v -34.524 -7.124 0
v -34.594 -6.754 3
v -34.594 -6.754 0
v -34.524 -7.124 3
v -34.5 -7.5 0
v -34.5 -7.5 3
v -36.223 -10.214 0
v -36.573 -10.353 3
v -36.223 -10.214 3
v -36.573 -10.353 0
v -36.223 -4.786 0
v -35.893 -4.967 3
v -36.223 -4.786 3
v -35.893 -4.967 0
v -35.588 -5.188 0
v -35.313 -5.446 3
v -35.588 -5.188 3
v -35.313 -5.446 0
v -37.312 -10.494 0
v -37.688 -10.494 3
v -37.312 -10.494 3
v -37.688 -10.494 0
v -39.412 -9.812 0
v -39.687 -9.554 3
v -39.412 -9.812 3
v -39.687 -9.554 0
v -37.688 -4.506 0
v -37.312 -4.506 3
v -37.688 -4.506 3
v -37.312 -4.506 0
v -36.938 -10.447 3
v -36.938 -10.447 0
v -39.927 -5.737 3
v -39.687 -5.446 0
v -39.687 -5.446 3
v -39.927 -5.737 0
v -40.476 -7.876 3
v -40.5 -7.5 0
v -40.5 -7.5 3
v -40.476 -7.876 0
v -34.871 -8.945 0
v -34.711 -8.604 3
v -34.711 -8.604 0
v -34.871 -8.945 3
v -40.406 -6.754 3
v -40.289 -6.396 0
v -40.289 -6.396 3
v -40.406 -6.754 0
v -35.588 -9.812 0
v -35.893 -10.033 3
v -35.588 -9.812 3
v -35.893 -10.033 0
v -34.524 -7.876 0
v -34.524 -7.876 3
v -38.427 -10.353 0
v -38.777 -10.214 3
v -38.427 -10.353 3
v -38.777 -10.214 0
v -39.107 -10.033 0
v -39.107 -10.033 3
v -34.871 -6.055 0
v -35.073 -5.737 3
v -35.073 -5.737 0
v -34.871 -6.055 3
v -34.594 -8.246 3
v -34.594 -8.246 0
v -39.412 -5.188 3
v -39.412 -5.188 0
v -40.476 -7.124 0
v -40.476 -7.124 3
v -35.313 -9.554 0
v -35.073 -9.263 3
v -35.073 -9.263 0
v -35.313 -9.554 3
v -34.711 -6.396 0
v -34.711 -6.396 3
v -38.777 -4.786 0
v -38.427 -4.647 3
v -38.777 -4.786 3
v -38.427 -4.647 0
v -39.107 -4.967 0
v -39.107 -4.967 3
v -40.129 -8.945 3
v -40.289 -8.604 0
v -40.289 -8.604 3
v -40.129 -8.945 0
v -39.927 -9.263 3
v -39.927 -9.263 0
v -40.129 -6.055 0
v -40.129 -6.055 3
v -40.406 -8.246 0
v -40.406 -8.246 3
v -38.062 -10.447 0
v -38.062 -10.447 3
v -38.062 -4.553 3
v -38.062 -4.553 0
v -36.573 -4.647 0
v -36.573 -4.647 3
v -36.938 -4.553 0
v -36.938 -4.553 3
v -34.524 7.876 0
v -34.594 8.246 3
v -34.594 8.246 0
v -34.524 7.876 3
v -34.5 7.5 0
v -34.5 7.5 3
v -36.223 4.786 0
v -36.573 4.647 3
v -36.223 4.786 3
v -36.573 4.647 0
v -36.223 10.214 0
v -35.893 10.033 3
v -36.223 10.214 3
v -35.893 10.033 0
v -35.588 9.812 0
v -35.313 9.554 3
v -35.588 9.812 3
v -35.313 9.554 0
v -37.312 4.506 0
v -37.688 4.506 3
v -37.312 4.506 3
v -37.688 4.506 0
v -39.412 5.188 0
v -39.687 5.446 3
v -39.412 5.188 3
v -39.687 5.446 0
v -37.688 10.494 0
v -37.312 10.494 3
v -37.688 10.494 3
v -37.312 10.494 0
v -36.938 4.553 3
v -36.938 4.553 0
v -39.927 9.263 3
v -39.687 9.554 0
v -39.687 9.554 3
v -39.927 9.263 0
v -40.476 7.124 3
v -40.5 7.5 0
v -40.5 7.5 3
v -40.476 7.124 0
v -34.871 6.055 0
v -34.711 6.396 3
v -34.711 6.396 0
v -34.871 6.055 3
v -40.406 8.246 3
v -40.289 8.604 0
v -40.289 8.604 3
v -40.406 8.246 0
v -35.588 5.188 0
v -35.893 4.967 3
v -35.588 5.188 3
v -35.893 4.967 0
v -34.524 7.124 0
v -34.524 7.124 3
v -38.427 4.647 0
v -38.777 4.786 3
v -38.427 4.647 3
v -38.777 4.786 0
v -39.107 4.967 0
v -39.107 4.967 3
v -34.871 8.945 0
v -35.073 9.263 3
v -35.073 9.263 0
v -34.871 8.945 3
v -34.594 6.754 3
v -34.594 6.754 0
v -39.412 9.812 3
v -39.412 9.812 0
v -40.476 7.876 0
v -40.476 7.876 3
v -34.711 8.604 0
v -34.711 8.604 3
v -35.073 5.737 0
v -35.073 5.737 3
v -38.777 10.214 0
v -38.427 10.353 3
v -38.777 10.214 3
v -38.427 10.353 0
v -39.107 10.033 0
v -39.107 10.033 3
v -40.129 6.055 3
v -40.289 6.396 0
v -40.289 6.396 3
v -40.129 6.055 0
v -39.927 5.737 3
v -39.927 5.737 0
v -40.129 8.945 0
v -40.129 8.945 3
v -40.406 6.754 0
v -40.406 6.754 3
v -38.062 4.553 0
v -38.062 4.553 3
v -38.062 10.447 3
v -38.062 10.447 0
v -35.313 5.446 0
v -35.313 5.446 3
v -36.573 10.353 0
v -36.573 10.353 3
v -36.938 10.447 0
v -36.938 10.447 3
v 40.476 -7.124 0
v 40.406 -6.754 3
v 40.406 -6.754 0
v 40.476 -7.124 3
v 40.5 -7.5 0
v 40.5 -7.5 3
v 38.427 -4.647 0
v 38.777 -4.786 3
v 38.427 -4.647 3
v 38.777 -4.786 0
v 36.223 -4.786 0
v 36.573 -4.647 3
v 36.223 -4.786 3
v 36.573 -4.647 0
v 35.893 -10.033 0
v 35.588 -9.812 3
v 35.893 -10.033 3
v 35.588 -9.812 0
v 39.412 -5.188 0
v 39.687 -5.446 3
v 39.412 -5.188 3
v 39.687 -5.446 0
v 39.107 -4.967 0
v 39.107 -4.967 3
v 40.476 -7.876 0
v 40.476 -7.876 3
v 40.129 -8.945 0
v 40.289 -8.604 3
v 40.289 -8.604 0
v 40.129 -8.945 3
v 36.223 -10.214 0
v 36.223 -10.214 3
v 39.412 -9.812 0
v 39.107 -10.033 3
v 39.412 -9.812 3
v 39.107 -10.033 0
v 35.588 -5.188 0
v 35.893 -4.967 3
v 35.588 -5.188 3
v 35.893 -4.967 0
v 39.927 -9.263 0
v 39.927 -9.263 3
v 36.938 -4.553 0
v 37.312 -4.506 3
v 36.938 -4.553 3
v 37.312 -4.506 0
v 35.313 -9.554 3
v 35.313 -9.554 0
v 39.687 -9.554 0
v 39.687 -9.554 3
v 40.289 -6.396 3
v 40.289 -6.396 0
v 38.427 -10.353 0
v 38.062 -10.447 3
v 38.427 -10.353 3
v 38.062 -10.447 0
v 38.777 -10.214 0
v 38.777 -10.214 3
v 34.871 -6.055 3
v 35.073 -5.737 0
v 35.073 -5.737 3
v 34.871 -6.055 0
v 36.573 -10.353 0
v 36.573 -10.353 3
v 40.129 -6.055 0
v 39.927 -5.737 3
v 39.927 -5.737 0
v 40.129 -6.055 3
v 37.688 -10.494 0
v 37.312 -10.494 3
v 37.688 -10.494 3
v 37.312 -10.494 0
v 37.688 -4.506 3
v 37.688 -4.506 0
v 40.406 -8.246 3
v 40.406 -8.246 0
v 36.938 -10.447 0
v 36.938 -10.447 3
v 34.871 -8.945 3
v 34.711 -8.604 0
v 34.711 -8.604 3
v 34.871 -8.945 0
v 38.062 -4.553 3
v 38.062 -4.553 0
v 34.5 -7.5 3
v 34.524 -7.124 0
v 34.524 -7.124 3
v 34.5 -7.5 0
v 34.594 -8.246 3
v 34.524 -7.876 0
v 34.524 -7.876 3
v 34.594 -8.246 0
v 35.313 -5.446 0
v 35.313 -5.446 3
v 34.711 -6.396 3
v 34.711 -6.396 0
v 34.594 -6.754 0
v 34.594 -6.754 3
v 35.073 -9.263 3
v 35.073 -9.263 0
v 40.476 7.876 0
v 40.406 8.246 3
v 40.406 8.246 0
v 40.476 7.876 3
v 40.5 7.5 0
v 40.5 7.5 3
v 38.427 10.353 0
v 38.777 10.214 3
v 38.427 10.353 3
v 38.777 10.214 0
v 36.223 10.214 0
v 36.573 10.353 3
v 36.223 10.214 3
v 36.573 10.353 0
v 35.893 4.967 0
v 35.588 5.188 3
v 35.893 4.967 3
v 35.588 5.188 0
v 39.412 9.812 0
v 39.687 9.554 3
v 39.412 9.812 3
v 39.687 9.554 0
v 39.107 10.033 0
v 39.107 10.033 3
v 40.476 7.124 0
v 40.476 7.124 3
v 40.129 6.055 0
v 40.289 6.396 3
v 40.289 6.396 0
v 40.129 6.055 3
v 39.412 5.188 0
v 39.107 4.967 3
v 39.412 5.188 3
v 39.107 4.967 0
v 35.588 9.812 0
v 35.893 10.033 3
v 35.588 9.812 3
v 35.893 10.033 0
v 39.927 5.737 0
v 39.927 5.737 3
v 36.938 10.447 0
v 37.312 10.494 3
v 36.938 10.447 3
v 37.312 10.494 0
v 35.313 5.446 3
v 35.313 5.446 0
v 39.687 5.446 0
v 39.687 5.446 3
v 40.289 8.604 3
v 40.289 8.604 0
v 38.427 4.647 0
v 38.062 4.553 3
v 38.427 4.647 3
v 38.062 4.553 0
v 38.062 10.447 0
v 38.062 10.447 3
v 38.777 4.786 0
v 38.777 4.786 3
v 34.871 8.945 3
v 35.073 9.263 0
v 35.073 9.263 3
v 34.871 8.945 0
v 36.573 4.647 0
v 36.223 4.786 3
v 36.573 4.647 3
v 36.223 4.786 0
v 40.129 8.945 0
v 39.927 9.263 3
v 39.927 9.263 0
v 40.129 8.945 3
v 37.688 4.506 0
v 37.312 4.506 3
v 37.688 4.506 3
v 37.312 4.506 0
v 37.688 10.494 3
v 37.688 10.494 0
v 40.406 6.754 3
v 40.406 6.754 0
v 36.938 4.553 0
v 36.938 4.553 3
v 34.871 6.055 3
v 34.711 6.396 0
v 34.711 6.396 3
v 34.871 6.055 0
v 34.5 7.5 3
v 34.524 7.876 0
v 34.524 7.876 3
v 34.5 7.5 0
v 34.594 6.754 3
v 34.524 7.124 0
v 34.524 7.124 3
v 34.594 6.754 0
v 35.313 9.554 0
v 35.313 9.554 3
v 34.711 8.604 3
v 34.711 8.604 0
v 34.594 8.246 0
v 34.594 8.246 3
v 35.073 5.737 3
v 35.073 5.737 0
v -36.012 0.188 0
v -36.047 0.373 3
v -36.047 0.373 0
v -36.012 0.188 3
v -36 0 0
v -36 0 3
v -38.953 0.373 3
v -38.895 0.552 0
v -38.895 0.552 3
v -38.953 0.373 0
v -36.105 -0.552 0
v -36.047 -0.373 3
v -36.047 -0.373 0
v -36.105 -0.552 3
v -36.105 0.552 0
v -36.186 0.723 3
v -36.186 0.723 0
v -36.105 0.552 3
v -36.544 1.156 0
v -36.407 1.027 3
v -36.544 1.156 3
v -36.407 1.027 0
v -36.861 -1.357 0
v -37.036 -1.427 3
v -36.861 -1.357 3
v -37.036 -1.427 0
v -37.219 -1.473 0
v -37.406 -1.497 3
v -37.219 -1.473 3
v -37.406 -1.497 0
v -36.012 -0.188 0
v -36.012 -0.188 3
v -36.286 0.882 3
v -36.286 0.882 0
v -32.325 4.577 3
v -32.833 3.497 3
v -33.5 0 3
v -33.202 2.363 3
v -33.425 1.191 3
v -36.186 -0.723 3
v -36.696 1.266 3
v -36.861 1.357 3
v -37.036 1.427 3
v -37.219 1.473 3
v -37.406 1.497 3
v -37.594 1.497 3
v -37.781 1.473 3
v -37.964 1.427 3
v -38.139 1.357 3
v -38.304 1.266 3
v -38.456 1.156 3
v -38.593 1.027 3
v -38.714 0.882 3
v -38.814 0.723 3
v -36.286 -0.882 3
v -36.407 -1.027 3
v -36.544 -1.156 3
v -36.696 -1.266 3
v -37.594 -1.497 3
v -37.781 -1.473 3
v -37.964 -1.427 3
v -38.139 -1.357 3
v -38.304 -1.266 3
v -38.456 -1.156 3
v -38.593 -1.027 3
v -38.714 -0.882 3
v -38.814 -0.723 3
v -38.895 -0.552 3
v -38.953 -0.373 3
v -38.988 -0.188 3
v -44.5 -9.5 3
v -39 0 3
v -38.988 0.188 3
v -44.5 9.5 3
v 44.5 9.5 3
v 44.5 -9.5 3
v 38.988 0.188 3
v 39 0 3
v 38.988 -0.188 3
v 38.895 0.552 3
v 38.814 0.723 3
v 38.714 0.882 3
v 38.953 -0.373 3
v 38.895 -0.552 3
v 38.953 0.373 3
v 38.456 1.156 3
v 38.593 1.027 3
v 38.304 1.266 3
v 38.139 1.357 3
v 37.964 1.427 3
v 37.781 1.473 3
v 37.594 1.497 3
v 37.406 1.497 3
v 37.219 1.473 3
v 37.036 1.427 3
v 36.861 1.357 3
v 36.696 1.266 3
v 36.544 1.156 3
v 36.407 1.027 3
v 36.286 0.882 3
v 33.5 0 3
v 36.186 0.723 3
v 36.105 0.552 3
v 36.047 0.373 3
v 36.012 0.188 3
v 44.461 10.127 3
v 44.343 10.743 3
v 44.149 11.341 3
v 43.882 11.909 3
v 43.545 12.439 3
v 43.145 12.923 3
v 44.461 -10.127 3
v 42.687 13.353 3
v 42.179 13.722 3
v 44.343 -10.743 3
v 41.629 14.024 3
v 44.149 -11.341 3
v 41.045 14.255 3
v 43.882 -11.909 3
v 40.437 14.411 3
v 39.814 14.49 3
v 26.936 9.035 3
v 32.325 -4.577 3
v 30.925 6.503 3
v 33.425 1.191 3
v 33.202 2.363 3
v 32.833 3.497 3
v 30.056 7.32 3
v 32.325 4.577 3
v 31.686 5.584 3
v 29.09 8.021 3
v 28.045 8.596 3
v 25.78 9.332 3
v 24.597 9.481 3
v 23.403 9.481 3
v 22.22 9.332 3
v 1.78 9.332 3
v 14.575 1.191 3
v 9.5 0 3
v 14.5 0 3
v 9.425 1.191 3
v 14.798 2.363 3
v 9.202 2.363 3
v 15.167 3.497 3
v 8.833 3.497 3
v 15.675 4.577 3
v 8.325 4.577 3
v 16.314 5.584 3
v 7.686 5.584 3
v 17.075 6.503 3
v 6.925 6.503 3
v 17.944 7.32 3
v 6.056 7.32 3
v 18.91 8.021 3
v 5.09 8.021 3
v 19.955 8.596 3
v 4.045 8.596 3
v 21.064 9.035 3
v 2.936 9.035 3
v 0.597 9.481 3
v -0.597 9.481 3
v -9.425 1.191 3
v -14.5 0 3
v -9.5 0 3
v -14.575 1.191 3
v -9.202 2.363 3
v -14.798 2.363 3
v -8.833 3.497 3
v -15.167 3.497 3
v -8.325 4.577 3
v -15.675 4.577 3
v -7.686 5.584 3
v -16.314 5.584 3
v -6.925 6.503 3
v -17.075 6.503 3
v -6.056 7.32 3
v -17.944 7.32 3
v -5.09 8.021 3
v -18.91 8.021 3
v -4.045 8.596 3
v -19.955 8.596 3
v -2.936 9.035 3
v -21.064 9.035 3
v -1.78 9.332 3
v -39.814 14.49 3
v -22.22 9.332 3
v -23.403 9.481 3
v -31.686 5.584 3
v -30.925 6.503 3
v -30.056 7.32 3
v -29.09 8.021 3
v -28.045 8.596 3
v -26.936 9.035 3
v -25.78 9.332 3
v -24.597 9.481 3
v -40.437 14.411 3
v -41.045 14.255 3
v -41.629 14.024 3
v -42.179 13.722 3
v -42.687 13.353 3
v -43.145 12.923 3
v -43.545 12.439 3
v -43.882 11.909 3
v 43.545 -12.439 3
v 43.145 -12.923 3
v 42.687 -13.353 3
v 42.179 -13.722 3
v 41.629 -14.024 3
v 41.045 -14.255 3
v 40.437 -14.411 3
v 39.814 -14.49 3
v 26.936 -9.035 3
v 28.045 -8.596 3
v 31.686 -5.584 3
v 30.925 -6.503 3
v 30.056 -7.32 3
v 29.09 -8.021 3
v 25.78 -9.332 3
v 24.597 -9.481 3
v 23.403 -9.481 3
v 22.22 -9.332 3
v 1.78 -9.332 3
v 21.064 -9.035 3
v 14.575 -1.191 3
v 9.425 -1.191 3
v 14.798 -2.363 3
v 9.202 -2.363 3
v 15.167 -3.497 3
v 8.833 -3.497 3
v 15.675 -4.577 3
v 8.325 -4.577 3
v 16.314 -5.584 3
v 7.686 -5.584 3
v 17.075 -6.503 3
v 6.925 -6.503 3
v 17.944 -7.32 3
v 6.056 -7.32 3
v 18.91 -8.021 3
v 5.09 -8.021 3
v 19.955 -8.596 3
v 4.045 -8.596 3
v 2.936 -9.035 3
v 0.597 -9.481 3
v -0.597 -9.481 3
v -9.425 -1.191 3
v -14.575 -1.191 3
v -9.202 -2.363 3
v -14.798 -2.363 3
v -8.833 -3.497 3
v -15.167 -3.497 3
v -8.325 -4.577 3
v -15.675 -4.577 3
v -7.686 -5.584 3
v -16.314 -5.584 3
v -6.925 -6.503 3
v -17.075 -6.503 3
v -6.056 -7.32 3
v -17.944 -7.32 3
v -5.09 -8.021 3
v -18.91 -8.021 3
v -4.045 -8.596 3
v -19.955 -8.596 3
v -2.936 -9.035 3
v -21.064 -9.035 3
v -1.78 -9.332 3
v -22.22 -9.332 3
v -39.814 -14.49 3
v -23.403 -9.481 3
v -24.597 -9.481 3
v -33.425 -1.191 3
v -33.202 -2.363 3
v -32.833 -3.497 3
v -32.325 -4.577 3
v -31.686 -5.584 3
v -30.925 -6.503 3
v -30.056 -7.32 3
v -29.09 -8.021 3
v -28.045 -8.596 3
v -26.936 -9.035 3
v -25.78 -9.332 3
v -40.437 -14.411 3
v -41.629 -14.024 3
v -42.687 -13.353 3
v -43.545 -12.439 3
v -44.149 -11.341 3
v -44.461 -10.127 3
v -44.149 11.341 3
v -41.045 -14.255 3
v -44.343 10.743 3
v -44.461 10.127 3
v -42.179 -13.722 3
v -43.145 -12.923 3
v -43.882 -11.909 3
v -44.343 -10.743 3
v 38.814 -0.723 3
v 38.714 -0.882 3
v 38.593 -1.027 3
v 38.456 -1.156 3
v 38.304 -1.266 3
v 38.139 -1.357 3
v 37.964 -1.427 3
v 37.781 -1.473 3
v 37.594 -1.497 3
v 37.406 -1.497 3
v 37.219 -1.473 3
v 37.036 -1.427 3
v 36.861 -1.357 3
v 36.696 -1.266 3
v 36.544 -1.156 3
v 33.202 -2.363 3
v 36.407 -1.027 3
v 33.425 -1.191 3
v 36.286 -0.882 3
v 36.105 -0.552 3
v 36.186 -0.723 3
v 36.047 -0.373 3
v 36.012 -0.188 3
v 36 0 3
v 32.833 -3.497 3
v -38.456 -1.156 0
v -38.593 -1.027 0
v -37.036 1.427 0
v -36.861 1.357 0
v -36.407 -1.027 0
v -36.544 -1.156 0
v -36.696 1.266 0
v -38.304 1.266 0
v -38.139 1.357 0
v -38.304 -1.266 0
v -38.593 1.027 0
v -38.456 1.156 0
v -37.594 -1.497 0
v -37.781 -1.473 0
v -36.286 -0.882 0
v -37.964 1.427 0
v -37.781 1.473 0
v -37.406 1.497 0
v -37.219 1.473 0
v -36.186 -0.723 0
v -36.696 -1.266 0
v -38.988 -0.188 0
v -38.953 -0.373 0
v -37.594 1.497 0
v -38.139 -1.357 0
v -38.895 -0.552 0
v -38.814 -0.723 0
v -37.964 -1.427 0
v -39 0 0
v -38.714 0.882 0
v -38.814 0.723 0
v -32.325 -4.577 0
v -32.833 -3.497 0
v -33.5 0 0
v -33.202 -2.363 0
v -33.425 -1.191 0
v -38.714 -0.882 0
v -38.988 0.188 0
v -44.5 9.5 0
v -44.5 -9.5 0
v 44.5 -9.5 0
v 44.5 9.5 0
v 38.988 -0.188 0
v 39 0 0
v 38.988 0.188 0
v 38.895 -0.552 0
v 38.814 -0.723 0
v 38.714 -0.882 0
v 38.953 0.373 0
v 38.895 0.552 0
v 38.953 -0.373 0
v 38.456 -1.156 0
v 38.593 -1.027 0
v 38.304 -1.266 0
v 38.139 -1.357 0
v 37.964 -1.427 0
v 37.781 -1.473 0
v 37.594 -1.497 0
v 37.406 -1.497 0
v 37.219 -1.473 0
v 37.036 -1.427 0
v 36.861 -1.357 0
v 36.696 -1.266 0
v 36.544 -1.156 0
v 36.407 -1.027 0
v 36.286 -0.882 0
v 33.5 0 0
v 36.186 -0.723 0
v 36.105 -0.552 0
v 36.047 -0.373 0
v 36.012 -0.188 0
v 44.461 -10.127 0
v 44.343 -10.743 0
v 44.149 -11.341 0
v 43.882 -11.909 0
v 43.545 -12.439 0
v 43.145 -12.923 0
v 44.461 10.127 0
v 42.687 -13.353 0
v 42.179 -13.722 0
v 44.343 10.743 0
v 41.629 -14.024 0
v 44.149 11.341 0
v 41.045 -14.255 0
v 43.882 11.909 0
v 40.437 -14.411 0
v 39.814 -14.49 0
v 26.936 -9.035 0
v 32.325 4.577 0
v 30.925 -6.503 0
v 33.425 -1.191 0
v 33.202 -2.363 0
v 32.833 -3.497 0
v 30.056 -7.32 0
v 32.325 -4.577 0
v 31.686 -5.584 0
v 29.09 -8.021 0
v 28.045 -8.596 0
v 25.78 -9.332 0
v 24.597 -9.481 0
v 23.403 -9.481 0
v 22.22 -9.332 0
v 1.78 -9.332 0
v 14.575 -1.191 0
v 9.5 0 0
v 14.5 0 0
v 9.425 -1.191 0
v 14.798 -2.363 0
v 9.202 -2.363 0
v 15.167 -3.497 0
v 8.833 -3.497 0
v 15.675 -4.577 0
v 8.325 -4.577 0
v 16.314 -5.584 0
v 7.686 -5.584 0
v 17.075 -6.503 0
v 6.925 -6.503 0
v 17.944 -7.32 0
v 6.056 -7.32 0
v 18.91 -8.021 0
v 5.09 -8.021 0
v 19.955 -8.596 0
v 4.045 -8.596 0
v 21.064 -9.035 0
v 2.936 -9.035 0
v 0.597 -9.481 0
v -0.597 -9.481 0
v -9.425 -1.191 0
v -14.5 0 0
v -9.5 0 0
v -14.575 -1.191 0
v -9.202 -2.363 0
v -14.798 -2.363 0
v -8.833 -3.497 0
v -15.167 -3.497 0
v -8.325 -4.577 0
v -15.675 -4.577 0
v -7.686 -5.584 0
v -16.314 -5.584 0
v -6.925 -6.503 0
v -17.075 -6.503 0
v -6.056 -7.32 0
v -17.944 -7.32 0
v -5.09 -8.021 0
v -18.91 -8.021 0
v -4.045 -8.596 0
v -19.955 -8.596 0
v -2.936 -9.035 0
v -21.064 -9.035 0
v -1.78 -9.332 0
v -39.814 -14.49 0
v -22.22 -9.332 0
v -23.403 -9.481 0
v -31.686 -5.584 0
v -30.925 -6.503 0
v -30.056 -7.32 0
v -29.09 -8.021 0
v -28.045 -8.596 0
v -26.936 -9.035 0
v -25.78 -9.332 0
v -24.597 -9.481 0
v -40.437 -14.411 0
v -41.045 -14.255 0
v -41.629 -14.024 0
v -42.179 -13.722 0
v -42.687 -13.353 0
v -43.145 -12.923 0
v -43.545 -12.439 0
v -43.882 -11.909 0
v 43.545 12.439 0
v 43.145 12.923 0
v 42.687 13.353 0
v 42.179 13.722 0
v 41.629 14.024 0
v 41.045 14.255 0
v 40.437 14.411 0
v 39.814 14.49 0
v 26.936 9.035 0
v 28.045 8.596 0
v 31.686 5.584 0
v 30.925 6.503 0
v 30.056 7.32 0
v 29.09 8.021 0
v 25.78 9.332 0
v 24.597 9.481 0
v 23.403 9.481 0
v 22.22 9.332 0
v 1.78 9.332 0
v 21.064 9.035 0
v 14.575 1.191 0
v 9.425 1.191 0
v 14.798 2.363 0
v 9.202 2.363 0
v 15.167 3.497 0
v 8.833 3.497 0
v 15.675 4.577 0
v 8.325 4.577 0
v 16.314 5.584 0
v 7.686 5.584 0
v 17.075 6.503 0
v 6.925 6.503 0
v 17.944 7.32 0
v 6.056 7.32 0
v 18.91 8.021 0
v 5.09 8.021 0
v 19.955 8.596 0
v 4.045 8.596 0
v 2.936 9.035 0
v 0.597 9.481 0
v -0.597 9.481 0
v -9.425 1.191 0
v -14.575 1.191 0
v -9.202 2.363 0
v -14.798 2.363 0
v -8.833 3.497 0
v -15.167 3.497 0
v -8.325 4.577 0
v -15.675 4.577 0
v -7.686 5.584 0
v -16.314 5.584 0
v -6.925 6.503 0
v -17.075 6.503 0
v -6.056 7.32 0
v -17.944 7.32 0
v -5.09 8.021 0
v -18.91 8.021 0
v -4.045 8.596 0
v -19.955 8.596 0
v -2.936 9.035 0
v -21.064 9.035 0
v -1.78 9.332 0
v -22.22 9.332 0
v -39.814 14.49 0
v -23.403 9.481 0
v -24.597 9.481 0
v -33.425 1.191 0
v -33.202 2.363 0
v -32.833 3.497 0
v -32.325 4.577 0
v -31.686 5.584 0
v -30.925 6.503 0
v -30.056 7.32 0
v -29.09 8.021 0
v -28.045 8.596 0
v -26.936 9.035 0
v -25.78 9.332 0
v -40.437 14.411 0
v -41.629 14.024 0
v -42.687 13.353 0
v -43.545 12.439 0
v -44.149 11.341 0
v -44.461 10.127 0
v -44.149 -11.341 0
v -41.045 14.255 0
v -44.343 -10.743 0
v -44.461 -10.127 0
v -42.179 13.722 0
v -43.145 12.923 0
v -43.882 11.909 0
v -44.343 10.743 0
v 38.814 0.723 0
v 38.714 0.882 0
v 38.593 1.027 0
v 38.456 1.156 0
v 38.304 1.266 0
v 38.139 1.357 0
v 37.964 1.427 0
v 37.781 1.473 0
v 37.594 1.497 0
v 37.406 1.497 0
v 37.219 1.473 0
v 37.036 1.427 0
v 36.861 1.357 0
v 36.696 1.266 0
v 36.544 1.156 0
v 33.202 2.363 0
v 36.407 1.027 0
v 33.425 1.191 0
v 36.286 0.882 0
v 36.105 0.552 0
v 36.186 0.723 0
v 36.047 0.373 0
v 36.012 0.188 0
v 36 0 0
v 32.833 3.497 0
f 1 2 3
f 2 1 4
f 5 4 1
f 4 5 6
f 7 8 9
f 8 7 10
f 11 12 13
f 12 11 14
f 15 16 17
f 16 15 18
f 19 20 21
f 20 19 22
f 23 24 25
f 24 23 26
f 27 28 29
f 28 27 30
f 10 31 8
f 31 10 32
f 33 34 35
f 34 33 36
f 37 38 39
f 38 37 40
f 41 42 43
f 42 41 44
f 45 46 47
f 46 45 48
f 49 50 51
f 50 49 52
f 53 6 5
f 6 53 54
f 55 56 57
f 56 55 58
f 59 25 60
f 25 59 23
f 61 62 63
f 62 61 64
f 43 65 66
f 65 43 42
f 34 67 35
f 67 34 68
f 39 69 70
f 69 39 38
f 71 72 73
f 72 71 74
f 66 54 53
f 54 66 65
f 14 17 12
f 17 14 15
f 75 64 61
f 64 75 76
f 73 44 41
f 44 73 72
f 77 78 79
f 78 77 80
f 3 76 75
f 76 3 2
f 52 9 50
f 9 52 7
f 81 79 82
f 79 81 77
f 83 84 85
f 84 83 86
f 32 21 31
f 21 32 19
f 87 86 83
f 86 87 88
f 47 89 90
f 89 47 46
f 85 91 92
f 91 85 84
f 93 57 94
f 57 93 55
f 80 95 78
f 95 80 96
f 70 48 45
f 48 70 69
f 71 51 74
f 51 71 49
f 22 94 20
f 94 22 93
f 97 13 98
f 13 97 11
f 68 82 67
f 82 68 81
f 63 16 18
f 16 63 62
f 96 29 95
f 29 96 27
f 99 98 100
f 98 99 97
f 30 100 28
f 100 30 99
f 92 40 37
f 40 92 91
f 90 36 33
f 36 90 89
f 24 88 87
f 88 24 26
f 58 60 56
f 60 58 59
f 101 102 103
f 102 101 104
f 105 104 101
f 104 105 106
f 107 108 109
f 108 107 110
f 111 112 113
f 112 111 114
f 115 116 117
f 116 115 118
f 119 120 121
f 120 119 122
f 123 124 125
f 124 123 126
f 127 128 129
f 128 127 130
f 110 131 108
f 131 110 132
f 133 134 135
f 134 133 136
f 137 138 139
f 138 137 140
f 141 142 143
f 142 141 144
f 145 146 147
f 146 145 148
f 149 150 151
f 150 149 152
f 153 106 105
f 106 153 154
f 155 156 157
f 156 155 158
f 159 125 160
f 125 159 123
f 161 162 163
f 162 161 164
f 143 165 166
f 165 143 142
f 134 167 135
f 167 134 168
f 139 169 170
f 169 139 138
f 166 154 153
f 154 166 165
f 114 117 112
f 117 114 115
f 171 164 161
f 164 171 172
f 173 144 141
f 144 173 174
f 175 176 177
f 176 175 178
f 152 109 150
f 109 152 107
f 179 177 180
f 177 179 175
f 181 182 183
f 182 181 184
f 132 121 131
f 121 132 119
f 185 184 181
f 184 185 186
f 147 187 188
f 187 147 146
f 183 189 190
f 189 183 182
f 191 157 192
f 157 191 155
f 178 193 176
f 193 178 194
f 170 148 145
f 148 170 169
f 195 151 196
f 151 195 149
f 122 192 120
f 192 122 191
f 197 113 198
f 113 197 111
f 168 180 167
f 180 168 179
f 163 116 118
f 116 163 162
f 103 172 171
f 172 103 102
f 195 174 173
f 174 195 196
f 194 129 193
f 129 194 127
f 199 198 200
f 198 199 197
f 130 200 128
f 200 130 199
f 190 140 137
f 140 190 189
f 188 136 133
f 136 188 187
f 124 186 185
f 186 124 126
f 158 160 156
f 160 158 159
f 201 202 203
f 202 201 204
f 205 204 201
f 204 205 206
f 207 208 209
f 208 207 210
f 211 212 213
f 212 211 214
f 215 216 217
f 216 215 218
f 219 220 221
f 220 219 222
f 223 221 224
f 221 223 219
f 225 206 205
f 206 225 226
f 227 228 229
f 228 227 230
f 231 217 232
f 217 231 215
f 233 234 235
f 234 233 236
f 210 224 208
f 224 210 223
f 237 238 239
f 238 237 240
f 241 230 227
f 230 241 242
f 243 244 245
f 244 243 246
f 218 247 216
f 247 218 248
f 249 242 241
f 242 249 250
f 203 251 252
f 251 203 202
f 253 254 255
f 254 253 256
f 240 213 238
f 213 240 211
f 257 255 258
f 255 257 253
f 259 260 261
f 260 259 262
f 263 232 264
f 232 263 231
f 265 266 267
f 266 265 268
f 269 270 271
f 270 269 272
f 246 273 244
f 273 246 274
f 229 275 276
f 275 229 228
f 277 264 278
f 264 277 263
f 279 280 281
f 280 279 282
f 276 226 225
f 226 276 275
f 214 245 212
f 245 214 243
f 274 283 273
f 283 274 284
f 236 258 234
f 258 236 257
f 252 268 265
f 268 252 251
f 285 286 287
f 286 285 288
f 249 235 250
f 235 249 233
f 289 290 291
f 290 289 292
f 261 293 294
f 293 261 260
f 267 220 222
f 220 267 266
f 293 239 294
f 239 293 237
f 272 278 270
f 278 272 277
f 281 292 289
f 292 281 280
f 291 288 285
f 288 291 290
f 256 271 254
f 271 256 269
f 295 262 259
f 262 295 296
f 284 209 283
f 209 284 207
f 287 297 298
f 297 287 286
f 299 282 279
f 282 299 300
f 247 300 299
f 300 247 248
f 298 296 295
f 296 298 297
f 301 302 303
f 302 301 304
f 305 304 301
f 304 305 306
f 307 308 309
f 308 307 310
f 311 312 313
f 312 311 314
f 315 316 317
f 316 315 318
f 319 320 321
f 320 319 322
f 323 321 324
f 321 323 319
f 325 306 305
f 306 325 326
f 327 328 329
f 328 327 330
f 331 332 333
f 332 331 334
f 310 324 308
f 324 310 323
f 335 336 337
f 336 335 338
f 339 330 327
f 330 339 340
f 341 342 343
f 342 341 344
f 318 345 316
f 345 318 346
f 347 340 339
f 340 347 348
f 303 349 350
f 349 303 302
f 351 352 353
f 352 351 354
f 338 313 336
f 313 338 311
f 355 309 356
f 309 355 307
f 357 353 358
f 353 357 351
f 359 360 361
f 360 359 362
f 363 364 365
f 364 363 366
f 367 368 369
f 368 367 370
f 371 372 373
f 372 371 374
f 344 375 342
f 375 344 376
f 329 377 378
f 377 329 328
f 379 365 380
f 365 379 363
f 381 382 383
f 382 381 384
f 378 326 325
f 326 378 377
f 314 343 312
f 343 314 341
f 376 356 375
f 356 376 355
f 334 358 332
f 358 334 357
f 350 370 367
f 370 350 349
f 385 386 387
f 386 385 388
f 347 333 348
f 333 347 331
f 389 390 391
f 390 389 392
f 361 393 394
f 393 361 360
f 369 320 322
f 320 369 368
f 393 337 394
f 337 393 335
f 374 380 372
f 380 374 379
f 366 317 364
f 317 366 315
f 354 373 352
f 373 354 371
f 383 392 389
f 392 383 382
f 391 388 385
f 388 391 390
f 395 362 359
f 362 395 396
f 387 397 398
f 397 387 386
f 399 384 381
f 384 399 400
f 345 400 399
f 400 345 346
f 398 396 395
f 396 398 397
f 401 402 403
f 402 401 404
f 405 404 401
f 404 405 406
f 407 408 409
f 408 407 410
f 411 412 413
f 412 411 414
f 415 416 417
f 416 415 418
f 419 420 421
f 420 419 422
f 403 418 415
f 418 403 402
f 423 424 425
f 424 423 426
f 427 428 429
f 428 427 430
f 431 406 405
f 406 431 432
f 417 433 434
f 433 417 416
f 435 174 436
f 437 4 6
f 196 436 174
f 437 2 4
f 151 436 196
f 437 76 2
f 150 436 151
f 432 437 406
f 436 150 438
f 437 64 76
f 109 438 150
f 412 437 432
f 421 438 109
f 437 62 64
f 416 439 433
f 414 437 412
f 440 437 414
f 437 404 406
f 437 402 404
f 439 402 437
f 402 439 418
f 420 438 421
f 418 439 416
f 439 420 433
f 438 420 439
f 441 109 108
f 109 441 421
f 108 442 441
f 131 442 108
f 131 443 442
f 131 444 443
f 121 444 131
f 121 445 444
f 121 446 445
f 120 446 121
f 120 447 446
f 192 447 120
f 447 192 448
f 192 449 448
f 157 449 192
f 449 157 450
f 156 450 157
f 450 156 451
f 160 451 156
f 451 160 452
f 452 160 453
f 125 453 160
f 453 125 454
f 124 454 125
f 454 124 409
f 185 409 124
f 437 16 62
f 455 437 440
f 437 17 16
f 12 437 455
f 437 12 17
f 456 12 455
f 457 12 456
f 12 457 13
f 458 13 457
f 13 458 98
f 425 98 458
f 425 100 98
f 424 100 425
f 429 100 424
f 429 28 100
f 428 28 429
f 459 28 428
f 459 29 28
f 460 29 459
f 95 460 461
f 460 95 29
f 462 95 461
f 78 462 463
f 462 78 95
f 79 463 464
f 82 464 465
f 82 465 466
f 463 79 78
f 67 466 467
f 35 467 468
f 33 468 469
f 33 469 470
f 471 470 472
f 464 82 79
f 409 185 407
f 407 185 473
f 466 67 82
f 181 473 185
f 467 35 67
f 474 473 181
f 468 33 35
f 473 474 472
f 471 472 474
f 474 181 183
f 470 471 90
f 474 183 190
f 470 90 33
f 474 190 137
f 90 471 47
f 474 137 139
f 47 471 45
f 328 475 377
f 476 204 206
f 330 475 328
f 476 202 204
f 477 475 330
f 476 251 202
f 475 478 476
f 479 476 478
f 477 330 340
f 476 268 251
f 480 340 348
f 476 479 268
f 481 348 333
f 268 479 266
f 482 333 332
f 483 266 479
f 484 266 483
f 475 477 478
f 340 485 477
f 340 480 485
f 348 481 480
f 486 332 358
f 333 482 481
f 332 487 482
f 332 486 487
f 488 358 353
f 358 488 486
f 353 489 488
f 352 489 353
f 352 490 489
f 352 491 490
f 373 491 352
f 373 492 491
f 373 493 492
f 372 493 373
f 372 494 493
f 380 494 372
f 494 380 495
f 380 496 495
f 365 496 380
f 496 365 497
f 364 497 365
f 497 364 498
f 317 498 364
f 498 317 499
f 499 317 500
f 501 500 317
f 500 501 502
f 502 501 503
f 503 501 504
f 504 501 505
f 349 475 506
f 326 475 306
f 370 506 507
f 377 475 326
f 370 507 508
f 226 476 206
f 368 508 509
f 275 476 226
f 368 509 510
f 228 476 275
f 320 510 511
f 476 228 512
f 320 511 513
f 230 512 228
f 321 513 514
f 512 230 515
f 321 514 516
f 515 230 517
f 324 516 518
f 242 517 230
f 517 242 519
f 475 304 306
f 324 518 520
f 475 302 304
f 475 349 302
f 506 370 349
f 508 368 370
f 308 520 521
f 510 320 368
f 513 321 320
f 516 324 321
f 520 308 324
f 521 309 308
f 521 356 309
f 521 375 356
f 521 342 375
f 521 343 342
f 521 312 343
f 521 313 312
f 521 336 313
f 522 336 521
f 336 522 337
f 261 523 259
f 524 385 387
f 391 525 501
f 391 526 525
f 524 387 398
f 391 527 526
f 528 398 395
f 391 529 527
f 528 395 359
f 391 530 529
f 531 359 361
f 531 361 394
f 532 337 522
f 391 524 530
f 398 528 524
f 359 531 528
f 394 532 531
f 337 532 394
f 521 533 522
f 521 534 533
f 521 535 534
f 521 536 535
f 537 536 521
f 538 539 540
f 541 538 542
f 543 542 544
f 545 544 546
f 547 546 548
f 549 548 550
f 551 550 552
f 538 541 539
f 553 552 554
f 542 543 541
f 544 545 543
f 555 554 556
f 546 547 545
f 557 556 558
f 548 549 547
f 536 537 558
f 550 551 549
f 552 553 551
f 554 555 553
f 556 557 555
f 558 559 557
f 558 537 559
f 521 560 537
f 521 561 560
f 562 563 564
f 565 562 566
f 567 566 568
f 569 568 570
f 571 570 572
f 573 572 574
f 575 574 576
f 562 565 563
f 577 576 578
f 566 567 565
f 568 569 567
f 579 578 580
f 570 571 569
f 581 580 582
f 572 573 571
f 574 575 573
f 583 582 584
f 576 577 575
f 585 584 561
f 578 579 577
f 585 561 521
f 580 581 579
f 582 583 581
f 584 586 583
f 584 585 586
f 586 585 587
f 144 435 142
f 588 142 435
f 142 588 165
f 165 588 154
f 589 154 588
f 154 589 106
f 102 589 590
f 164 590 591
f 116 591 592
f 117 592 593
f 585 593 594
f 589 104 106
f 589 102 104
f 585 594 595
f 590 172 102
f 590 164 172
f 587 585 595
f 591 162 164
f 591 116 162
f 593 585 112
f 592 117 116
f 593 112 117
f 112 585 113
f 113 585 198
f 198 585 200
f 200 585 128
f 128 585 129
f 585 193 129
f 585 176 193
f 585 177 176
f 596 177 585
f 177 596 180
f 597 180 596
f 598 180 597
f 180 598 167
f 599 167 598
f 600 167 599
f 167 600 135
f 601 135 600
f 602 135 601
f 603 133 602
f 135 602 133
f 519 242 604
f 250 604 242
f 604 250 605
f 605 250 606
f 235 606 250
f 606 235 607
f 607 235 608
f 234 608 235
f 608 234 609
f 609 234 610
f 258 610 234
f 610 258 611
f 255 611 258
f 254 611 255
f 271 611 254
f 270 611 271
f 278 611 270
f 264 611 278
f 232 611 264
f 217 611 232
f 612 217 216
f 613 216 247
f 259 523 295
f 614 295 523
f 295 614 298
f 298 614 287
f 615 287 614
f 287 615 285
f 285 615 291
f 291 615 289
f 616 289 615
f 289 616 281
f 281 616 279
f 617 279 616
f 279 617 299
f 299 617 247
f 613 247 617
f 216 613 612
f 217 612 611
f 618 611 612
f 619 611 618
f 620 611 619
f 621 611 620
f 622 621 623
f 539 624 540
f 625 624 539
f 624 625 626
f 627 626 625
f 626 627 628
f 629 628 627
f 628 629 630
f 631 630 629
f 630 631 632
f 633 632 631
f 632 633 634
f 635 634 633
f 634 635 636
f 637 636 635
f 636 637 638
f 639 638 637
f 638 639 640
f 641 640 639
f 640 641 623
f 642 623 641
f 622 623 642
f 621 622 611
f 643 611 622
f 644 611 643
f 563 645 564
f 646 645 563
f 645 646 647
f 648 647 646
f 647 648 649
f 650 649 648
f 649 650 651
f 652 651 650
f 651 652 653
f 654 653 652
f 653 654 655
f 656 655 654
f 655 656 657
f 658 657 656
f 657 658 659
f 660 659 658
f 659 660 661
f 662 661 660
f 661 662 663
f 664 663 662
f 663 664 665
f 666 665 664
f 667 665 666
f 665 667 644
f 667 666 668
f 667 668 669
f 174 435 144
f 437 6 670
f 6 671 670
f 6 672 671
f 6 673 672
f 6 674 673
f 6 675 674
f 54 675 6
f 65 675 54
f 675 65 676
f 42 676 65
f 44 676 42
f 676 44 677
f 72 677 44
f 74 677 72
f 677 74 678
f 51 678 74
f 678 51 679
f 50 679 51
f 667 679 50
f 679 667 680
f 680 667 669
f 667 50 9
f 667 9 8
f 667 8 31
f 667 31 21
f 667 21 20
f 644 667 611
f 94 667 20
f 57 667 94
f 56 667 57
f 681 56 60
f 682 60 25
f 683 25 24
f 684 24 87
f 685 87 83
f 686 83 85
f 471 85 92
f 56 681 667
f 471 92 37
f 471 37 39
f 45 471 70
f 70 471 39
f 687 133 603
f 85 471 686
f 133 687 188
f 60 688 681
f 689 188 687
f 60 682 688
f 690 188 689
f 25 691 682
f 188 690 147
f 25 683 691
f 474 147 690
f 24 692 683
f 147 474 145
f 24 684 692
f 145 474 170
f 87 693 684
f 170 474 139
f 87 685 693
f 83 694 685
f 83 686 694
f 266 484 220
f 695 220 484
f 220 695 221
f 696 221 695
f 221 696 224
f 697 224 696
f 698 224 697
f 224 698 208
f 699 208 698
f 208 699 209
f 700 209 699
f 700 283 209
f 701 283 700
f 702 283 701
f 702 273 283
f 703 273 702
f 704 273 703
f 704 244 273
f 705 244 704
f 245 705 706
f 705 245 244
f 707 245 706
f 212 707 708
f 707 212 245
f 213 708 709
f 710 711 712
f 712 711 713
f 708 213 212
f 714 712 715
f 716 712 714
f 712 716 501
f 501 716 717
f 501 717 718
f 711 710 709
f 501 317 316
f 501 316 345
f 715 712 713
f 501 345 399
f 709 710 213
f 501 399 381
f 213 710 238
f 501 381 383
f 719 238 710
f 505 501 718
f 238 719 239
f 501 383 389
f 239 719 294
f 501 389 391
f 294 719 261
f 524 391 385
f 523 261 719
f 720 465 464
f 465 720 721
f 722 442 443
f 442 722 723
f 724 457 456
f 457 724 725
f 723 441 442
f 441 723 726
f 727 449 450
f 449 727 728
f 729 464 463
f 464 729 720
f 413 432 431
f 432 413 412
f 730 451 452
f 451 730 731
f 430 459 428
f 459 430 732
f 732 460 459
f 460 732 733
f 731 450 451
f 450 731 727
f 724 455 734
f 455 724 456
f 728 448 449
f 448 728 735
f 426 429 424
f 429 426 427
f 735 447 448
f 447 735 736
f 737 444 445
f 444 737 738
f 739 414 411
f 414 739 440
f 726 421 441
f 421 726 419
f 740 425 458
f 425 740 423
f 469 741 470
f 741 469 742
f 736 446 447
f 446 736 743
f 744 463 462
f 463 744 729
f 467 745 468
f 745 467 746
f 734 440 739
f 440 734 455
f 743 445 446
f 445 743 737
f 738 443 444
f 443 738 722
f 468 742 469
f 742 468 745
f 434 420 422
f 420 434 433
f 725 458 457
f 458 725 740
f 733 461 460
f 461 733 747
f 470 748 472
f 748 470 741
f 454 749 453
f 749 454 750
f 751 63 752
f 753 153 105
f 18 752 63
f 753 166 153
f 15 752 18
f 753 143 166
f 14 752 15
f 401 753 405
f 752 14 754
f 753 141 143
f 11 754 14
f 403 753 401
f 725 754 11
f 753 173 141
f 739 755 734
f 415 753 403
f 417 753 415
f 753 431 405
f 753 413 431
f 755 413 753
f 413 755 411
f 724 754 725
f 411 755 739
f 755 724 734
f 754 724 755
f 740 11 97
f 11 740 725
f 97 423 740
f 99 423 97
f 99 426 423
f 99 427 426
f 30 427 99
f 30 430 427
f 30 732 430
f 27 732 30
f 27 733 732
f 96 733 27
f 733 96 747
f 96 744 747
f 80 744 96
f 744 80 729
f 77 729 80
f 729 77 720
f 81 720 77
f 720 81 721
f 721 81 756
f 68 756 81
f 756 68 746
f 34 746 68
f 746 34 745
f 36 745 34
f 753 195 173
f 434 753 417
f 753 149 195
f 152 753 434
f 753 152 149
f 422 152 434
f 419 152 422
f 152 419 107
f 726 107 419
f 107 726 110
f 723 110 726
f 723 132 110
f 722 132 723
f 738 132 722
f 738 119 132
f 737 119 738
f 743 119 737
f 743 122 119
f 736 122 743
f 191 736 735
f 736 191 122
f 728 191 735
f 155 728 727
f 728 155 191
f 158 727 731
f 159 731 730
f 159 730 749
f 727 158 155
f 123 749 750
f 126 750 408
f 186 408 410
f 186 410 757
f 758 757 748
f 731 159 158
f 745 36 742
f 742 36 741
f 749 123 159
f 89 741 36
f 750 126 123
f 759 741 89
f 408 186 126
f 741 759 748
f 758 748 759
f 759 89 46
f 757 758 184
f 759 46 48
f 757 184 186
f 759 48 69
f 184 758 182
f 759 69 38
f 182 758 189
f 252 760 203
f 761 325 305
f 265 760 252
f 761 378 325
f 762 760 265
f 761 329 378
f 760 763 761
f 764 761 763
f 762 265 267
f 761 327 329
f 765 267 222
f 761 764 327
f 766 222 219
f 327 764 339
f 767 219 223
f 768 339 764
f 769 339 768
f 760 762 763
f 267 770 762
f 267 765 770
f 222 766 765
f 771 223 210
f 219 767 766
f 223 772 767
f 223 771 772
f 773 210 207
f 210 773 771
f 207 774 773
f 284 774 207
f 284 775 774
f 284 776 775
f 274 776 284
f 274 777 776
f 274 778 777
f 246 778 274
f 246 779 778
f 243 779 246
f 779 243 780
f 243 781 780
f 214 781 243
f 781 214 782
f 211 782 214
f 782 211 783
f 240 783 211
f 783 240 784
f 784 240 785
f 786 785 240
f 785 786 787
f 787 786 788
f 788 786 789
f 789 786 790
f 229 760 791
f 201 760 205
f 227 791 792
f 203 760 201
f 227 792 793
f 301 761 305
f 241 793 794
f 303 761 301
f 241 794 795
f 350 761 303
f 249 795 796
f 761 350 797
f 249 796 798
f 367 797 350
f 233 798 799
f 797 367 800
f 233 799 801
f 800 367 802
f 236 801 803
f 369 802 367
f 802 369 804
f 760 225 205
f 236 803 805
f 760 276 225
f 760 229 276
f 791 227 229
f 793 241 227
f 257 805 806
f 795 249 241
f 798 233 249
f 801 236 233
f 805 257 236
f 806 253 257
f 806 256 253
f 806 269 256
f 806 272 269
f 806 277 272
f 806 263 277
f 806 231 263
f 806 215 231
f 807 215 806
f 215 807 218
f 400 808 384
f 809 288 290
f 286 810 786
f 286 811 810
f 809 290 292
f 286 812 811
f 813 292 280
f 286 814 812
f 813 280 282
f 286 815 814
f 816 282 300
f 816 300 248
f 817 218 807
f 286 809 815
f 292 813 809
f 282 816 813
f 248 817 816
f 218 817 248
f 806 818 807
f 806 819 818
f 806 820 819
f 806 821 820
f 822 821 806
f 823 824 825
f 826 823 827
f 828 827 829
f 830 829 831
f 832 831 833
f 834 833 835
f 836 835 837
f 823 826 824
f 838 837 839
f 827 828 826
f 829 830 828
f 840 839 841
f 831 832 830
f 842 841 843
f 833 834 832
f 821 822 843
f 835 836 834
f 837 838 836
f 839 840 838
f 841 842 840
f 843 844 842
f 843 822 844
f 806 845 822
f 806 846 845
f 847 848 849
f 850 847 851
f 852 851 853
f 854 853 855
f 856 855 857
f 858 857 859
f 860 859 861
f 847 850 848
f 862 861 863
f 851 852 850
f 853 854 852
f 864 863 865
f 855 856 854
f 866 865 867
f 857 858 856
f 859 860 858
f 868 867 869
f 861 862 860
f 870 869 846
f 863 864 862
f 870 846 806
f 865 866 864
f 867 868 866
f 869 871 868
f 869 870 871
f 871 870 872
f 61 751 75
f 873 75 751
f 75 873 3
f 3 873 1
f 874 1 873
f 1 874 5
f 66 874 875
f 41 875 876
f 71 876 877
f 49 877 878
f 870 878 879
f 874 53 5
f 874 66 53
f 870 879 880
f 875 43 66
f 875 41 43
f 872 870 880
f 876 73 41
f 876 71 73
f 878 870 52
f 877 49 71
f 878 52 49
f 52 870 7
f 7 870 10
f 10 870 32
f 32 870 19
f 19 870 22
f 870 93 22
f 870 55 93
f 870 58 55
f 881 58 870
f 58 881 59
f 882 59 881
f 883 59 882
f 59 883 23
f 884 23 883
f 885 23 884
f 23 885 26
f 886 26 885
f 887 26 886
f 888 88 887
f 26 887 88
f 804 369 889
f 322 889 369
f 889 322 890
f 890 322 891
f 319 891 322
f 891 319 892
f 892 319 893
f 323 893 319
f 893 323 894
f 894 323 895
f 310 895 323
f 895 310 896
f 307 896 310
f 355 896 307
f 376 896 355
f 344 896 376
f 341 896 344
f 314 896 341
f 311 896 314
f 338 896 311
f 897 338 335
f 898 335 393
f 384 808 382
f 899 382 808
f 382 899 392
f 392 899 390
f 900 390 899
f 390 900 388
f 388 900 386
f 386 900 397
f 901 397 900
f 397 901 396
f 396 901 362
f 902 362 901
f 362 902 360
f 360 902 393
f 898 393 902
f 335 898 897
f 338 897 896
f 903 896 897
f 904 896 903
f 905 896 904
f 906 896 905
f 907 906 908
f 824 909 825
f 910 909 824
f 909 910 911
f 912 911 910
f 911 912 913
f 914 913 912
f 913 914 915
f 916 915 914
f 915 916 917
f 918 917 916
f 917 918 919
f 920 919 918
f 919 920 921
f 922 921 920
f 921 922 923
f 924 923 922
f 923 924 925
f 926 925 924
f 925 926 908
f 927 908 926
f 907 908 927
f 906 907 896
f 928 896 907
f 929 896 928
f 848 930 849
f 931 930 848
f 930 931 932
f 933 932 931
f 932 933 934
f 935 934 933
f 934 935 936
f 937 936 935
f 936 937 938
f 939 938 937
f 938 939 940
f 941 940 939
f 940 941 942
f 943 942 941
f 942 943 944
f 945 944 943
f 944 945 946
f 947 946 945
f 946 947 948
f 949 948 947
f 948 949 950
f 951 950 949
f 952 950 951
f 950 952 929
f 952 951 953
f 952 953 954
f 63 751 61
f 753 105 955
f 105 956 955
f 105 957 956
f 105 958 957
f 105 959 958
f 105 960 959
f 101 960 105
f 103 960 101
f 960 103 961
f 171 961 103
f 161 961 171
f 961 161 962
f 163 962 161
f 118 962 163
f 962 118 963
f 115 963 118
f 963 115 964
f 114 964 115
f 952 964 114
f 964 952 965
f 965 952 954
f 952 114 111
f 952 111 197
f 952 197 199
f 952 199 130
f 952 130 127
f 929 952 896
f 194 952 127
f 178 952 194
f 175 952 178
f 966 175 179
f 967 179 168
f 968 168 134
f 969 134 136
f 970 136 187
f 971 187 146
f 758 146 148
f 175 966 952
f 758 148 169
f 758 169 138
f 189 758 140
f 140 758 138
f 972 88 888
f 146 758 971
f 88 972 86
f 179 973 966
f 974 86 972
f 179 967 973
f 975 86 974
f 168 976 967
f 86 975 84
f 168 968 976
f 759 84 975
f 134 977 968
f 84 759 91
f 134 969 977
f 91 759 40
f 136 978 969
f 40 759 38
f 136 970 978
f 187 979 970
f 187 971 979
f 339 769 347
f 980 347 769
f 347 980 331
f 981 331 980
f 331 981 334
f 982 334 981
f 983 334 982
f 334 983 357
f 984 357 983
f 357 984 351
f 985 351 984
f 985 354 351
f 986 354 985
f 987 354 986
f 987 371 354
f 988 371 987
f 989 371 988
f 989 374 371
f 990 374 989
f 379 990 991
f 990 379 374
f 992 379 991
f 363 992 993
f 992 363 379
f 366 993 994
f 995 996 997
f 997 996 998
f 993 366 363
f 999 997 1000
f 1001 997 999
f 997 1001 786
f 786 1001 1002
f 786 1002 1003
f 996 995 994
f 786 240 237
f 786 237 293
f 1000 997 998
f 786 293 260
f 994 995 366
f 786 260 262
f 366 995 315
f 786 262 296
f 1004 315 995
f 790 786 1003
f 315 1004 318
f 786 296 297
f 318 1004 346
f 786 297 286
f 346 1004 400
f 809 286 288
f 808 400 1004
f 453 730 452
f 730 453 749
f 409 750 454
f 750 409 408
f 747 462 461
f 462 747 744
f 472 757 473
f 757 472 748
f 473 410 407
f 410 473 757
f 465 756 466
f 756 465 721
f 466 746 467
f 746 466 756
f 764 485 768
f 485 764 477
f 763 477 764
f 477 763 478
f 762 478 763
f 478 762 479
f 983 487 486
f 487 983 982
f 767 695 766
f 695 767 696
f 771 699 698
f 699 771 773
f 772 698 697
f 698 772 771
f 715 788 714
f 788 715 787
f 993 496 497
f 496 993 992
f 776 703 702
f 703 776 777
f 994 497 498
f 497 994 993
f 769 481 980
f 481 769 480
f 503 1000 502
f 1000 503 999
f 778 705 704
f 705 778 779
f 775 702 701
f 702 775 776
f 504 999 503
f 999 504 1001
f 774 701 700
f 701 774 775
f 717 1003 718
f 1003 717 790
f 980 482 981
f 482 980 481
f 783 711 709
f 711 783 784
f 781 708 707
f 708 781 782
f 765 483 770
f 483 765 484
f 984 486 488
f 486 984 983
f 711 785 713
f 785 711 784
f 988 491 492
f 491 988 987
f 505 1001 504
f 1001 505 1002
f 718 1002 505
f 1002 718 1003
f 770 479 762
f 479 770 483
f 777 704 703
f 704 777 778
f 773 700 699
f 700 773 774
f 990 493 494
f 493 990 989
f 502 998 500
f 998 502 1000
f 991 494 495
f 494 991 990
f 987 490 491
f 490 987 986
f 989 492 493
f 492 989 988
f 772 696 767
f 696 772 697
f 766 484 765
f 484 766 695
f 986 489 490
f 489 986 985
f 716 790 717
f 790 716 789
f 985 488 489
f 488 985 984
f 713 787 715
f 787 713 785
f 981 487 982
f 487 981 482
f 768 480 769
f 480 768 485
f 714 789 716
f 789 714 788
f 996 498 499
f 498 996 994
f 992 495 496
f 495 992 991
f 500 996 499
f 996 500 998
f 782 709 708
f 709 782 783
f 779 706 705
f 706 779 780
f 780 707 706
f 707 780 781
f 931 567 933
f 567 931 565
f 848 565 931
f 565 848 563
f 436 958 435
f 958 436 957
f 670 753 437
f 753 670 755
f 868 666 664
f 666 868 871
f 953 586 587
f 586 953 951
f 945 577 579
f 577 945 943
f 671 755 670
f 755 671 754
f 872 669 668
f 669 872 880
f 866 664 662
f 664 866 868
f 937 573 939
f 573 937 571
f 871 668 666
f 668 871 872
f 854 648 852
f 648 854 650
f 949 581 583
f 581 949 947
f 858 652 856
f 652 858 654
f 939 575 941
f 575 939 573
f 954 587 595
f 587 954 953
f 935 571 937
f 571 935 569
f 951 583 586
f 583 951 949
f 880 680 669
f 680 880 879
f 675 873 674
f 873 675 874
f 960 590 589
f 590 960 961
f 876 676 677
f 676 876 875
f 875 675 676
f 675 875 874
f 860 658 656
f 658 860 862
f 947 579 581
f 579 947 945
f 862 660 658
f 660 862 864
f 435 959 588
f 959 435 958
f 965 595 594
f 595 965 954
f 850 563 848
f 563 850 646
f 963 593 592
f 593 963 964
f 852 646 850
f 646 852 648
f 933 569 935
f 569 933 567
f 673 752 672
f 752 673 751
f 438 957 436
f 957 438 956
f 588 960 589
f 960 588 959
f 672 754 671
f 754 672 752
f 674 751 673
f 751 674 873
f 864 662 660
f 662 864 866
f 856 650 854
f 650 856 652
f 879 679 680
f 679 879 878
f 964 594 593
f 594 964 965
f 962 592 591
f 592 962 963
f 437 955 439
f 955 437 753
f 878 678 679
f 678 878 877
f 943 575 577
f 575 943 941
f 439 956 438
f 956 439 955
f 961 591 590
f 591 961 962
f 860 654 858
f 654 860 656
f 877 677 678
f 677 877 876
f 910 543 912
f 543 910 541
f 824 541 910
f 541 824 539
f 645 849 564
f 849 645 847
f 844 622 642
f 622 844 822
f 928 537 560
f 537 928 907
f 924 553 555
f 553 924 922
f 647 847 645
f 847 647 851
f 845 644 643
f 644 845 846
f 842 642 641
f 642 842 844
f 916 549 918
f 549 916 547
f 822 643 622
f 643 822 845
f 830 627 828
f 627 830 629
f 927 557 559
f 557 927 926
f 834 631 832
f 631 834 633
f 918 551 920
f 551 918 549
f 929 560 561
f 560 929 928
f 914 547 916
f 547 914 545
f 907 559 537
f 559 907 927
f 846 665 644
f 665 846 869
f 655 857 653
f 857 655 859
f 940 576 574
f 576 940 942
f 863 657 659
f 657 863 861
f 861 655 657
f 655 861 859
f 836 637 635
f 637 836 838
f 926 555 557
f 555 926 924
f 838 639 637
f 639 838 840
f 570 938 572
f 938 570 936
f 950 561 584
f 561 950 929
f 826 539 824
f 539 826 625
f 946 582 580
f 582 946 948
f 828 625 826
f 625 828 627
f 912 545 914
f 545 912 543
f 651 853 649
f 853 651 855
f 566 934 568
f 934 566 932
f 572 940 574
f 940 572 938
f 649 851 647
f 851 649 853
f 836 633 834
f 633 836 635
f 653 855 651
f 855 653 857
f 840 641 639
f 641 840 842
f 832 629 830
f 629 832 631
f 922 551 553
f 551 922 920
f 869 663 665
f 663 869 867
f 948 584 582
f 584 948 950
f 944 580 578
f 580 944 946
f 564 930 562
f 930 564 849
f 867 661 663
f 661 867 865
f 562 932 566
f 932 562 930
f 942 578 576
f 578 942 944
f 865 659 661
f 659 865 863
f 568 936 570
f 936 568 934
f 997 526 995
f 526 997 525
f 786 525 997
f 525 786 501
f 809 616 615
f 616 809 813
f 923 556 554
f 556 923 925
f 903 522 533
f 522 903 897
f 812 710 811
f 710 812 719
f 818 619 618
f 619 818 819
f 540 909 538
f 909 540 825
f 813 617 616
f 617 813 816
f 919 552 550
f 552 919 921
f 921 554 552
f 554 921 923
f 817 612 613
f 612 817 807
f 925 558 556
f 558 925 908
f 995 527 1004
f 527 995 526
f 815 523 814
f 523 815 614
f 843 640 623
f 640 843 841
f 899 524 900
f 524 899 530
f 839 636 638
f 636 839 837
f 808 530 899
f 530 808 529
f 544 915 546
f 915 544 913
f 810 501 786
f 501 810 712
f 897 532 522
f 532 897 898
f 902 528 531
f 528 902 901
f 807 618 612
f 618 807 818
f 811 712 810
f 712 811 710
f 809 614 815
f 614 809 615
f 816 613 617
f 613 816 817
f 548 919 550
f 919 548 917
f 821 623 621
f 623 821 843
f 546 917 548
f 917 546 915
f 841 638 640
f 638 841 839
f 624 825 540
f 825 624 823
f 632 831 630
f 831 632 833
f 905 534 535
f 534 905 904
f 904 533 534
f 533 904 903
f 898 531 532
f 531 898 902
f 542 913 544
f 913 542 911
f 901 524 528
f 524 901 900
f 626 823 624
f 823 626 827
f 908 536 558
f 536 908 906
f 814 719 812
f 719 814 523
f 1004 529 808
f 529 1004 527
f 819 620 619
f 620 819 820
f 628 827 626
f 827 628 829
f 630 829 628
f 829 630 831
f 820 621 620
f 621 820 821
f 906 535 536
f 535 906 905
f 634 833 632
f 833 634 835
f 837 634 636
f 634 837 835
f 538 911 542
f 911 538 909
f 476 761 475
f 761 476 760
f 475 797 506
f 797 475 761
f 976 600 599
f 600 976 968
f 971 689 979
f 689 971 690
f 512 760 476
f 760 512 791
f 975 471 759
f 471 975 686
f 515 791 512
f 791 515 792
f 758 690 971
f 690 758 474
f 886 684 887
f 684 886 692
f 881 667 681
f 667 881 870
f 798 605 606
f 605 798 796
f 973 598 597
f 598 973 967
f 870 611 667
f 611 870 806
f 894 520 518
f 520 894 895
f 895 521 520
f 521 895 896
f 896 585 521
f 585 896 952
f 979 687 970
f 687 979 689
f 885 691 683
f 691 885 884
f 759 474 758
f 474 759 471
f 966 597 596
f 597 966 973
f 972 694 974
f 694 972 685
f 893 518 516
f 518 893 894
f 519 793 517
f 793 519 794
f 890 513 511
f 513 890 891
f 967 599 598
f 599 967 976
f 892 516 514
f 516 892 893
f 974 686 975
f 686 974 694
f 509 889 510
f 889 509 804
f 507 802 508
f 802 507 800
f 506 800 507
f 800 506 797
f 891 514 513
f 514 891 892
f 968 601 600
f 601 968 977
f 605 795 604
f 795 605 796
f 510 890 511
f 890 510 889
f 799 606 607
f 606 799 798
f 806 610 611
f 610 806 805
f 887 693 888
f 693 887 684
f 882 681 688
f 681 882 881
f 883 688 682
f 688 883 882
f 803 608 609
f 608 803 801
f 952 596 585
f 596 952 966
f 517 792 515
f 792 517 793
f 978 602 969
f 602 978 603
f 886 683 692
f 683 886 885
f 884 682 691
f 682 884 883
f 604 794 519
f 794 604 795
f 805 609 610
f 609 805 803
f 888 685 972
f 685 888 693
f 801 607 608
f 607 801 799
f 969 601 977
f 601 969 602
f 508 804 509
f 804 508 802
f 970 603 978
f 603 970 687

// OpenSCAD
$fn = 50;


difference() {
	union() {
		hull() {
			translate(v = [-39.5000000000, 9.5000000000, 0]) {
				cylinder(h = 3, r = 5);
			}
			translate(v = [39.5000000000, 9.5000000000, 0]) {
				cylinder(h = 3, r = 5);
			}
			translate(v = [-39.5000000000, -9.5000000000, 0]) {
				cylinder(h = 3, r = 5);
			}
			translate(v = [39.5000000000, -9.5000000000, 0]) {
				cylinder(h = 3, r = 5);
			}
		}
	}
	union() {
		#translate(v = [-37.5000000000, -7.5000000000, 0]) {
			cylinder(h = 3, r = 3.0000000000);
		}
		#translate(v = [-37.5000000000, 7.5000000000, 0]) {
			cylinder(h = 3, r = 3.0000000000);
		}
		#translate(v = [37.5000000000, -7.5000000000, 0]) {
			cylinder(h = 3, r = 3.0000000000);
		}
		#translate(v = [37.5000000000, 7.5000000000, 0]) {
			cylinder(h = 3, r = 3.0000000000);
		}
		#translate(v = [-37.5000000000, -7.5000000000, -100.0000000000]) {
			cylinder(h = 200, r = 3.0000000000);
		}
		#translate(v = [-37.5000000000, 7.5000000000, -100.0000000000]) {
			cylinder(h = 200, r = 3.0000000000);
		}
		#translate(v = [37.5000000000, -7.5000000000, -100.0000000000]) {
			cylinder(h = 200, r = 3.0000000000);
		}
		#translate(v = [37.5000000000, 7.5000000000, -100.0000000000]) {
			cylinder(h = 200, r = 3.0000000000);
		}
		#translate(v = [-37.5000000000, -7.5000000000, 0]) {
			cylinder(h = 3, r = 1.5000000000);
		}
		#translate(v = [-37.5000000000, 0.0000000000, 0]) {
			cylinder(h = 3, r = 1.5000000000);
		}
		#translate(v = [-37.5000000000, 7.5000000000, 0]) {
			cylinder(h = 3, r = 1.5000000000);
		}
		#translate(v = [37.5000000000, -7.5000000000, 0]) {
			cylinder(h = 3, r = 1.5000000000);
		}
		#translate(v = [37.5000000000, 0.0000000000, 0]) {
			cylinder(h = 3, r = 1.5000000000);
		}
		#translate(v = [37.5000000000, 7.5000000000, 0]) {
			cylinder(h = 3, r = 1.5000000000);
		}
		#translate(v = [-37.5000000000, -7.5000000000, 0]) {
			cylinder(h = 3, r = 1.5000000000);
		}
		#translate(v = [-37.5000000000, 0.0000000000, 0]) {
			cylinder(h = 3, r = 1.5000000000);
		}
		#translate(v = [-37.5000000000, 7.5000000000, 0]) {
			cylinder(h = 3, r = 1.5000000000);
		}
		#translate(v = [37.5000000000, -7.5000000000, 0]) {
			cylinder(h = 3, r = 1.5000000000);
		}
		#translate(v = [37.5000000000, 0.0000000000, 0]) {
			cylinder(h = 3, r = 1.5000000000);
		}
		#translate(v = [37.5000000000, 7.5000000000, 0]) {
			cylinder(h = 3, r = 1.5000000000);
		}
		#translate(v = [-37.5000000000, -7.5000000000, 0]) {
			cylinder(h = 3, r = 1.5000000000);
		}
		#translate(v = [-37.5000000000, 0.0000000000, 0]) {
			cylinder(h = 3, r = 1.5000000000);
		}
		#translate(v = [-37.5000000000, 7.5000000000, 0]) {
			cylinder(h = 3, r = 1.5000000000);
		}
		#translate(v = [37.5000000000, -7.5000000000, 0]) {
			cylinder(h = 3, r = 1.5000000000);
		}
		#translate(v = [37.5000000000, 0.0000000000, 0]) {
			cylinder(h = 3, r = 1.5000000000);
		}
		#translate(v = [37.5000000000, 7.5000000000, 0]) {
			cylinder(h = 3, r = 1.5000000000);
		}
		#translate(v = [-24.0000000000, 0, 0]) {
			cylinder(h = 3, r = 9.5000000000);
		}
		#cylinder(h = 3, r = 9.5000000000);
		#translate(v = [24.0000000000, 0, 0]) {
			cylinder(h = 3, r = 9.5000000000);
		}
	}
}
